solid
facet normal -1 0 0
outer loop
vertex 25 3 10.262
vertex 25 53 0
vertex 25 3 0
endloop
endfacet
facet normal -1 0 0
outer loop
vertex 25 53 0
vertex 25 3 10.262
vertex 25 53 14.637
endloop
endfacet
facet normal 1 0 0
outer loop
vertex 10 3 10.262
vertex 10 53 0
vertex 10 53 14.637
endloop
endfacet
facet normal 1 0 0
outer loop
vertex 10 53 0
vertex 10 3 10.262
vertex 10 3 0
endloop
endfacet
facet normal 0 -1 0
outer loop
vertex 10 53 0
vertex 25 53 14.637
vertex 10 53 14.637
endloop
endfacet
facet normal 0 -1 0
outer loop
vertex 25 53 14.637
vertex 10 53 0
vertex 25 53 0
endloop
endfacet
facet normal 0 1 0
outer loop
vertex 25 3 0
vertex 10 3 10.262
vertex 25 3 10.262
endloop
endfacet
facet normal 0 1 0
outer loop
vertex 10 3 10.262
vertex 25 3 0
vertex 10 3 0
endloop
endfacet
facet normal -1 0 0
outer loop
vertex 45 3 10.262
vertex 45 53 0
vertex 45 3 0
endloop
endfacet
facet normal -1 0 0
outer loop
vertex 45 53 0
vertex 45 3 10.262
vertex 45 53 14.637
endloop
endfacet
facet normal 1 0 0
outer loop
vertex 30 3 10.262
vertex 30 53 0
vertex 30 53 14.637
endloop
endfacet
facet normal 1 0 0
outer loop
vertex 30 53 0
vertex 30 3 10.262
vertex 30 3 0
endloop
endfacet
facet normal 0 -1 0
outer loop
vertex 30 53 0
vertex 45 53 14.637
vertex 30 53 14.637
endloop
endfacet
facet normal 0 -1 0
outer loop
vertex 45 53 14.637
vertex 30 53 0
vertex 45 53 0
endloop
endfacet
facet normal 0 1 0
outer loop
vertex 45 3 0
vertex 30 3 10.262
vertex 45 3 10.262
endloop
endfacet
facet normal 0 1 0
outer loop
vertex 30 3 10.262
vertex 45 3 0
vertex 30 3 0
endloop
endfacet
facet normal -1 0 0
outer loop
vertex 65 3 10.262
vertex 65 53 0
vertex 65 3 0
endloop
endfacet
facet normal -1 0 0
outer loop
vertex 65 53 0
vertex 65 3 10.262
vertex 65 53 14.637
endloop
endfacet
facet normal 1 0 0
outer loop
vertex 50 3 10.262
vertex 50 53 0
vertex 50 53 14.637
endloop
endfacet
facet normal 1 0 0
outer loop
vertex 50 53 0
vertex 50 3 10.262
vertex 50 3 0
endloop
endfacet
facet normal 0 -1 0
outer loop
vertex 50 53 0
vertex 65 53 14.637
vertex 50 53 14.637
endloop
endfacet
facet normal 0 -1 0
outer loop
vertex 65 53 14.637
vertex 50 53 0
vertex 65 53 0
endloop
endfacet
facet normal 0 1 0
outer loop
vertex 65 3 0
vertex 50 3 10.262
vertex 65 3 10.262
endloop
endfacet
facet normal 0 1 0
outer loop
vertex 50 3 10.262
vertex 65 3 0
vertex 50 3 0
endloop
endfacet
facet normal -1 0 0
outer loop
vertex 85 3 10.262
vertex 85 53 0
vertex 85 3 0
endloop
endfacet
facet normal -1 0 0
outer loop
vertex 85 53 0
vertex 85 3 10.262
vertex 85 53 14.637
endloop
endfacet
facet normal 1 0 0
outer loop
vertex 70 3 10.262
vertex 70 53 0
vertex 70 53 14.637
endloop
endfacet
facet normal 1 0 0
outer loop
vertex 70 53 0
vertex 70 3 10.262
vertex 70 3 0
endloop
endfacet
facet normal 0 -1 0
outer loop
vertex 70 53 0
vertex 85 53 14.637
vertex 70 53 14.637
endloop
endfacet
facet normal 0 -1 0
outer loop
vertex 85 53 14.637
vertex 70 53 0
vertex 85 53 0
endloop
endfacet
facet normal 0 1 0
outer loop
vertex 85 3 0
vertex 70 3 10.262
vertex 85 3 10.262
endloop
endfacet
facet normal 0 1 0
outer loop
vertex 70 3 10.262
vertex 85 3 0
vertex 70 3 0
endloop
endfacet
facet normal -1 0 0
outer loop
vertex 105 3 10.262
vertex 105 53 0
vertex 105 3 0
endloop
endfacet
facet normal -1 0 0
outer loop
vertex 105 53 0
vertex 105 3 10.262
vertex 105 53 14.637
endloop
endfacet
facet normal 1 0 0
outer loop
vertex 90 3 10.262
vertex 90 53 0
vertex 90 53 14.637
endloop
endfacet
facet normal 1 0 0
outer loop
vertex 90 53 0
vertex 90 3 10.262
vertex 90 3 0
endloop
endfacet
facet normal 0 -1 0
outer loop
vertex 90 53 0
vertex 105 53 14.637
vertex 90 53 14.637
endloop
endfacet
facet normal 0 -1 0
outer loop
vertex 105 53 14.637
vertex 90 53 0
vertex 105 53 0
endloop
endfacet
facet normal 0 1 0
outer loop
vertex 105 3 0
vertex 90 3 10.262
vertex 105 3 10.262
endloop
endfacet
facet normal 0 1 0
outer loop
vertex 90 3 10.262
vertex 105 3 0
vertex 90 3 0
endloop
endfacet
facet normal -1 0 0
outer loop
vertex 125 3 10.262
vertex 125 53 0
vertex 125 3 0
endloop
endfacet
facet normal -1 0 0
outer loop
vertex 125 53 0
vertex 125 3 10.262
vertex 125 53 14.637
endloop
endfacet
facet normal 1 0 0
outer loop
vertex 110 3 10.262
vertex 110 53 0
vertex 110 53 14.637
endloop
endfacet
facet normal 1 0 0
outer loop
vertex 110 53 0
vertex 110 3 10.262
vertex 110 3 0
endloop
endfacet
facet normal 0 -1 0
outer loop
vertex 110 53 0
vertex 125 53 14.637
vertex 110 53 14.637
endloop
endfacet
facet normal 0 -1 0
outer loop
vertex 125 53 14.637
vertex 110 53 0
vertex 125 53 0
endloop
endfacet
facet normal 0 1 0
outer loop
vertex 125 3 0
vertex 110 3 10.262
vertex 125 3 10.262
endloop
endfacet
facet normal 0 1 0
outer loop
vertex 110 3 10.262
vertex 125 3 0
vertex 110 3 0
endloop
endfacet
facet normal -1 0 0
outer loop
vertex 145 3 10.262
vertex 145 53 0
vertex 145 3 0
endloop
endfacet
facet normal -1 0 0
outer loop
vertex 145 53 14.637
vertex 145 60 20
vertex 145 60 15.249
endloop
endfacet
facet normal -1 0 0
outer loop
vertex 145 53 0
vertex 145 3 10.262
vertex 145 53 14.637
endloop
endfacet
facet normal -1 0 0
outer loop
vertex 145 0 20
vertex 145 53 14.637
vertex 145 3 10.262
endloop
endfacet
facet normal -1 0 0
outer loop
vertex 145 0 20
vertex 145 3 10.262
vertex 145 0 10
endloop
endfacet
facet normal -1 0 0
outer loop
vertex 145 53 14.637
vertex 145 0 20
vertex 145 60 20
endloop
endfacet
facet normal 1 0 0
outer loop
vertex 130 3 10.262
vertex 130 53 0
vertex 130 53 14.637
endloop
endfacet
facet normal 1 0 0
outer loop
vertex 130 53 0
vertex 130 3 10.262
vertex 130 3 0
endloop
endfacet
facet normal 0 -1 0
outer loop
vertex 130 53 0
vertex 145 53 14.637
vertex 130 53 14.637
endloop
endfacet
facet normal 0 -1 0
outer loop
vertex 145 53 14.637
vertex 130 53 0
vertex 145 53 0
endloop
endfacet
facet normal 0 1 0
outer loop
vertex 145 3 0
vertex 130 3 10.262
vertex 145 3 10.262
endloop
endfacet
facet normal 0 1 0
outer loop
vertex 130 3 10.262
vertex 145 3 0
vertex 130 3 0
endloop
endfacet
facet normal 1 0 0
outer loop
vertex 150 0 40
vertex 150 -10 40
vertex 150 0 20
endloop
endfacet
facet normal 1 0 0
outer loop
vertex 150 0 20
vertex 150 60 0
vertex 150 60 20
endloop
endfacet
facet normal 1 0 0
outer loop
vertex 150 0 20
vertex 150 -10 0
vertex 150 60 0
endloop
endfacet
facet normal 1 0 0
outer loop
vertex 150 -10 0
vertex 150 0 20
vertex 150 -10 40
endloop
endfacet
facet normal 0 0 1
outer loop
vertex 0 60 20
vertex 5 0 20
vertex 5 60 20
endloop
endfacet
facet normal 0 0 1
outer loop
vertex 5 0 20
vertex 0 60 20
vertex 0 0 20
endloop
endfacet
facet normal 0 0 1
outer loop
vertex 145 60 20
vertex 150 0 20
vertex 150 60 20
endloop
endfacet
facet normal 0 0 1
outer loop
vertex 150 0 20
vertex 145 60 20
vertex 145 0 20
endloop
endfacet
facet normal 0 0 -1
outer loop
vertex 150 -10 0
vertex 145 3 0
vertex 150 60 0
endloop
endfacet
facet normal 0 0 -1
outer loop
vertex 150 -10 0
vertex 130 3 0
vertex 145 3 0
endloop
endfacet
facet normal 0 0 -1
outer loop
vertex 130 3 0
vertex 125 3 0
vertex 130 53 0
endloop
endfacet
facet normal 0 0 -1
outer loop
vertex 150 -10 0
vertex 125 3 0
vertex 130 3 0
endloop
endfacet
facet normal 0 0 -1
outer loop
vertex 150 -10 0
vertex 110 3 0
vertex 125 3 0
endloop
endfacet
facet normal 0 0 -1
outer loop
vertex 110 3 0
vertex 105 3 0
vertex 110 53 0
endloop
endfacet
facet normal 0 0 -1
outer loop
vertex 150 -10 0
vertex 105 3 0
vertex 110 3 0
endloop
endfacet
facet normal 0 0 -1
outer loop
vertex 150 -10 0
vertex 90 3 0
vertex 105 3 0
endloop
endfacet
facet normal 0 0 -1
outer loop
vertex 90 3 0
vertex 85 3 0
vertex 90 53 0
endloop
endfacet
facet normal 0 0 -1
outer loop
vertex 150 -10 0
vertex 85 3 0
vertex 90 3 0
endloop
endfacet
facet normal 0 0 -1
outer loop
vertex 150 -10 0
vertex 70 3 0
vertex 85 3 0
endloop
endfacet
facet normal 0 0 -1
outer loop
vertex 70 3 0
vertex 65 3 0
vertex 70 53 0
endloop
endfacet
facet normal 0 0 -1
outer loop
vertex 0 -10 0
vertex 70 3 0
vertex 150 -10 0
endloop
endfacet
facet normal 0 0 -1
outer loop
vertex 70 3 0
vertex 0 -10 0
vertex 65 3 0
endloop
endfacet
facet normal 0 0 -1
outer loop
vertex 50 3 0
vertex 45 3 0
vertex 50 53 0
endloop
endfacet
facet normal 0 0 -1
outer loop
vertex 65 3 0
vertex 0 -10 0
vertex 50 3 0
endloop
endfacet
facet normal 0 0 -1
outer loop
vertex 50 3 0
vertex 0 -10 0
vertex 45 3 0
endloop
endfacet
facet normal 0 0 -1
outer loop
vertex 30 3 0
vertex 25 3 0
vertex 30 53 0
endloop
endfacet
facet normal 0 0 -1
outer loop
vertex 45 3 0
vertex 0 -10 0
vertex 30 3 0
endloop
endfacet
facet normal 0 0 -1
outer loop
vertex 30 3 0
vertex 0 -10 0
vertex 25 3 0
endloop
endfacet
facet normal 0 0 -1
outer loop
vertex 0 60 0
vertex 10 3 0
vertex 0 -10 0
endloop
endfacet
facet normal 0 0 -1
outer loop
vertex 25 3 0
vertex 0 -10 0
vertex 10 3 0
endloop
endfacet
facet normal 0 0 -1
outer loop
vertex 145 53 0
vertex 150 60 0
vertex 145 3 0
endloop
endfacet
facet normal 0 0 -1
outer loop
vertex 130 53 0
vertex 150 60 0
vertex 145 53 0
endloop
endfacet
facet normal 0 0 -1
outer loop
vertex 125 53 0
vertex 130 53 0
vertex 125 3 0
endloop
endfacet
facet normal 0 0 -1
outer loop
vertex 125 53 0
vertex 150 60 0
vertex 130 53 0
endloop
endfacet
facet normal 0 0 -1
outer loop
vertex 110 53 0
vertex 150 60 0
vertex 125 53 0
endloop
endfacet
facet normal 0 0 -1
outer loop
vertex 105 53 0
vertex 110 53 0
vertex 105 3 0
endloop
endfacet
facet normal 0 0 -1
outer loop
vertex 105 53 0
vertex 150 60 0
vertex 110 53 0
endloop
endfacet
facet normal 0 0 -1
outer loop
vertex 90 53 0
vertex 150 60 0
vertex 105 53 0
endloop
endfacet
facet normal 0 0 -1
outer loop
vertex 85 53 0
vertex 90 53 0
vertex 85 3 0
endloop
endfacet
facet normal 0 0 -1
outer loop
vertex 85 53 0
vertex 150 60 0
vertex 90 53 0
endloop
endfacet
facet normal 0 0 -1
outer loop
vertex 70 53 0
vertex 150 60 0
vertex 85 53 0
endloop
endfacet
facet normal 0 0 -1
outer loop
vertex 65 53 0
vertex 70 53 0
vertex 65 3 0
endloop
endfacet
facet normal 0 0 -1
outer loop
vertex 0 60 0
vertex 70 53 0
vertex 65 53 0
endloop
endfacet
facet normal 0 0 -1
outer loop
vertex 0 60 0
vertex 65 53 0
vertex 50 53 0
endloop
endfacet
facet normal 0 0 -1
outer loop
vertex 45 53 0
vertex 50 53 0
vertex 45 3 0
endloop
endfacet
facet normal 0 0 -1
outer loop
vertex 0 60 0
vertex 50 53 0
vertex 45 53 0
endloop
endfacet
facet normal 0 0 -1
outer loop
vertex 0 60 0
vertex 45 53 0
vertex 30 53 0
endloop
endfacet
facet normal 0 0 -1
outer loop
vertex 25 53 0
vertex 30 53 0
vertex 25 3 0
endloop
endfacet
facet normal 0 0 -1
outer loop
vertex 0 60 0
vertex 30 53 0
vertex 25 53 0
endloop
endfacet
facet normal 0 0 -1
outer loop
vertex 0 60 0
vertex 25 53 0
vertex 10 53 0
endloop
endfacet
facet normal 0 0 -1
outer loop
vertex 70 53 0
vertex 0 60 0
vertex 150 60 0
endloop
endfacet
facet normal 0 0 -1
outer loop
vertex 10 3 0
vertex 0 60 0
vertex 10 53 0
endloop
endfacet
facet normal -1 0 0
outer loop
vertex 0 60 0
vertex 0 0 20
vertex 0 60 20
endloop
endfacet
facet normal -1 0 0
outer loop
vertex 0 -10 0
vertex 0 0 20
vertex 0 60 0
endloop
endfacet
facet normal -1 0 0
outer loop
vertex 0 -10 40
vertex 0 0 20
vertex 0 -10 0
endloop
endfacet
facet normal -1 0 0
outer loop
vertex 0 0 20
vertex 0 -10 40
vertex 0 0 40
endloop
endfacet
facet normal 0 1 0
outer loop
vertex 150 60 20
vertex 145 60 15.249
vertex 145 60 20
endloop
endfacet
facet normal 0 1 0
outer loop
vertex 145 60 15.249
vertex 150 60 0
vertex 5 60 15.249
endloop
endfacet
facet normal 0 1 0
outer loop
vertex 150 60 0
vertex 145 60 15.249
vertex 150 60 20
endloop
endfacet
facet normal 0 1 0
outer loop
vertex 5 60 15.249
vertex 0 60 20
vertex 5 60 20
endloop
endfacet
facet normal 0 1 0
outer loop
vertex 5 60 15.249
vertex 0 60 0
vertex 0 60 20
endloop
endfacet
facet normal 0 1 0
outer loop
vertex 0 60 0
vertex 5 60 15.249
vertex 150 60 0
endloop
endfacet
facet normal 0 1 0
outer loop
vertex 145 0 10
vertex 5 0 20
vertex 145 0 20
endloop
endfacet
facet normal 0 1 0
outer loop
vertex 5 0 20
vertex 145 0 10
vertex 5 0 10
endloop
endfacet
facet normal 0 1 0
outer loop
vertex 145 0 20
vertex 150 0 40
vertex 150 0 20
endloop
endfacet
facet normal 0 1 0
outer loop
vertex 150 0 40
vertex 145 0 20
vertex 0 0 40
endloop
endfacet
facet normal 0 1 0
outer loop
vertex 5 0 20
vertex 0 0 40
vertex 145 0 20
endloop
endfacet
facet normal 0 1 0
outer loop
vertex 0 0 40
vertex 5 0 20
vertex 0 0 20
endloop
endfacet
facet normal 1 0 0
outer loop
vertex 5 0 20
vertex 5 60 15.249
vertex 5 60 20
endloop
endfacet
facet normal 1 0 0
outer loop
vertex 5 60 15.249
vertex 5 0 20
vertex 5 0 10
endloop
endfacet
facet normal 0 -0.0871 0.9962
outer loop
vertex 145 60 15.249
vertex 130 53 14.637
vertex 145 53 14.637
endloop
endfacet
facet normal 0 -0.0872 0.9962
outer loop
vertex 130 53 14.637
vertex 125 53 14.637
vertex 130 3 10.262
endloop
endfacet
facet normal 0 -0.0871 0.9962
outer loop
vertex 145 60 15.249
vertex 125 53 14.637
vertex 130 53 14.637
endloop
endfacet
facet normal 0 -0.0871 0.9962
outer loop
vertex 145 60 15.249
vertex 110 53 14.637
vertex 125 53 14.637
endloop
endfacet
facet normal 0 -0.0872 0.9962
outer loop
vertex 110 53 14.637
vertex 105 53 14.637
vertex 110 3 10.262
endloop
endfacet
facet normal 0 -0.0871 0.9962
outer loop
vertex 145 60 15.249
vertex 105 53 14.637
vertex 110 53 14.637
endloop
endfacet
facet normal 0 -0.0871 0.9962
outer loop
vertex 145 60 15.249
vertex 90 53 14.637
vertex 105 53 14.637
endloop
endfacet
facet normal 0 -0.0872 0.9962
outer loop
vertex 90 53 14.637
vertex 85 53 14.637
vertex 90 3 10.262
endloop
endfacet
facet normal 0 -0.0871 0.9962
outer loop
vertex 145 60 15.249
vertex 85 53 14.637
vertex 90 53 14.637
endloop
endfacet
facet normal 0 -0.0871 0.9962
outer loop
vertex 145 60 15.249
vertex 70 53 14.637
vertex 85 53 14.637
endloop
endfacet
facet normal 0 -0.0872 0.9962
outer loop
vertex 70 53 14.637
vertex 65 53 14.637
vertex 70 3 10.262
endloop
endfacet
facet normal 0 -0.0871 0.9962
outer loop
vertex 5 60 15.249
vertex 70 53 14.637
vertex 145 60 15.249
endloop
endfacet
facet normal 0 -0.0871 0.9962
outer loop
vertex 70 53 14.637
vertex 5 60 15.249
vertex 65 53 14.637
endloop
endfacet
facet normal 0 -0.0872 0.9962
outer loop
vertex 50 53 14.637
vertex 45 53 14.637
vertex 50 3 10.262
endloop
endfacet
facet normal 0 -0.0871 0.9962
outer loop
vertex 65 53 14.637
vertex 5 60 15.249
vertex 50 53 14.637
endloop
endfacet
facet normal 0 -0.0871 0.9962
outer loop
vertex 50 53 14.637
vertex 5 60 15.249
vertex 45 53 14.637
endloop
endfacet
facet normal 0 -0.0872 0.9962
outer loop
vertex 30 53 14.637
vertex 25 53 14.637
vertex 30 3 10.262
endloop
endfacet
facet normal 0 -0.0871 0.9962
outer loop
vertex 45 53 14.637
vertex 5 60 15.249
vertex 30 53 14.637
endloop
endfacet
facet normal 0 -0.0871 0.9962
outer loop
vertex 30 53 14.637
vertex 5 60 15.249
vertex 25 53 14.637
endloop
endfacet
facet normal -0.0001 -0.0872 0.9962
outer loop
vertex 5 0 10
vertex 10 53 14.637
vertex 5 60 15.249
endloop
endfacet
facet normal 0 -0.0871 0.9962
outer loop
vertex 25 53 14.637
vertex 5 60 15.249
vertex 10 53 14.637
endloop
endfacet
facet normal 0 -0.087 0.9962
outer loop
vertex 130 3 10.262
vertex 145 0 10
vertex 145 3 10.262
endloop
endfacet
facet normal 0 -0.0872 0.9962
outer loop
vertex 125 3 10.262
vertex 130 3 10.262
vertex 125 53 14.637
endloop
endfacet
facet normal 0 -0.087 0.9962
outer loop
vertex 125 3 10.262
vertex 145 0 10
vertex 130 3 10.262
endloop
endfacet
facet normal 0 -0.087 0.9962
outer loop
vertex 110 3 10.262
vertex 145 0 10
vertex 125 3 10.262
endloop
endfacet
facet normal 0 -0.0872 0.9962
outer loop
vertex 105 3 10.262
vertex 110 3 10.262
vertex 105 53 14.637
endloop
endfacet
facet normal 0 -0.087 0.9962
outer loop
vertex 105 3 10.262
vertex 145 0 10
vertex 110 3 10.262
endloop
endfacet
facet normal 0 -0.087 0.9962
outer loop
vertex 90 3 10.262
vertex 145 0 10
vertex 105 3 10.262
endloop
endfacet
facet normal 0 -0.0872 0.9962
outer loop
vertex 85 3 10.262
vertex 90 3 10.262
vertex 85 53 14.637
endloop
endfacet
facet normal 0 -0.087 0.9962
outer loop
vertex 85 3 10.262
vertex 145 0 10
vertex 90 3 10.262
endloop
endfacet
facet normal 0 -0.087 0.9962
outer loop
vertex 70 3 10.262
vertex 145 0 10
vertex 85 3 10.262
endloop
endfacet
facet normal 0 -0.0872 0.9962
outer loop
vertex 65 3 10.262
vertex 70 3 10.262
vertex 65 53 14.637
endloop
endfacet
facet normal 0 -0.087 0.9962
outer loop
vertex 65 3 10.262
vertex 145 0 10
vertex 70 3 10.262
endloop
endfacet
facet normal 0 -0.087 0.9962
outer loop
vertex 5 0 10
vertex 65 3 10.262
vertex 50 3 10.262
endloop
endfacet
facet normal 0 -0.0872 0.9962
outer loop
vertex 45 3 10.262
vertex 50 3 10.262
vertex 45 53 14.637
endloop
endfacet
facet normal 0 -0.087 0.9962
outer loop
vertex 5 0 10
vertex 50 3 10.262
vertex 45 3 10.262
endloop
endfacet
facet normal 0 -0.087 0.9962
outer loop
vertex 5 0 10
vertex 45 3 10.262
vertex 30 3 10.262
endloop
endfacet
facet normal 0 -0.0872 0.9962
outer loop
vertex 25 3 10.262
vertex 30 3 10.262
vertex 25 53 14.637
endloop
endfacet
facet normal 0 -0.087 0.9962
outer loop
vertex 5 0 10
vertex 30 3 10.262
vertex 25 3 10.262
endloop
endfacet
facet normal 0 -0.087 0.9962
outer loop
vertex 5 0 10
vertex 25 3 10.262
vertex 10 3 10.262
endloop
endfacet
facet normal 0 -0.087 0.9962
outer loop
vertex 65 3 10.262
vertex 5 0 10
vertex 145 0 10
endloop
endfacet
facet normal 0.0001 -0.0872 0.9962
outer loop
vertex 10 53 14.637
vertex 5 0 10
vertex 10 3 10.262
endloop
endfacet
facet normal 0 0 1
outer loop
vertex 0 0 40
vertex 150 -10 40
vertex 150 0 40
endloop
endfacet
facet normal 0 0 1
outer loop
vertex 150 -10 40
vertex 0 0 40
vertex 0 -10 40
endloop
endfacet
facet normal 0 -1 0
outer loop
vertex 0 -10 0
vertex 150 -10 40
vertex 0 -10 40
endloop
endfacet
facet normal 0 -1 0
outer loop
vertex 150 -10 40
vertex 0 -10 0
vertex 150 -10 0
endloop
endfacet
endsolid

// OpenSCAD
// Scad Template
//
//  Copyright 2012 John Cooper 
//
//  This program is free software: you can redistribute it and/or modify
//  it under the terms of the GNU General Public License as published by
//  the Free Software Foundation, either version 3 of the License, or
//   (at your option) any later version.
//
//  This program is distributed in the hope that it will be useful,
//  but WITHOUT ANY WARRANTY; without even the implied warranty of
//  MERCHANTABILITY or FITNESS FOR A PARTICULAR PURPOSE.  See the
//  GNU General Public License for more details.
//
//  You should have received a copy of the GNU General Public License
//  along with this program.  If not, see <http://www.gnu.org/licenses/>.

// Add some smoothing
$fs=0.2;

width=150;
depth=60;

module back() {
  translate([0, -10, 0]) {
    cube([150, 10, 40]);
  }
}

module snowboard() {
  cube([15, 50, 50]);
}

module base() {
  difference () {
    // Main base
    cube([width, depth, 20]);
    // Carve out the main shape
    translate([5, 0, 10]) {
      rotate([5, 0, 0]) {
        cube([width -10, depth * 1.2, 20]);
      }
    }
    // Remove the snowboards
    for ( r = [0,1,2,3,4,5,6] ) {
      translate([10 + r * 20, 3, -1]) {
        snowboard();
      }
    }
  }

}

union() {
  base();
  back();
}
